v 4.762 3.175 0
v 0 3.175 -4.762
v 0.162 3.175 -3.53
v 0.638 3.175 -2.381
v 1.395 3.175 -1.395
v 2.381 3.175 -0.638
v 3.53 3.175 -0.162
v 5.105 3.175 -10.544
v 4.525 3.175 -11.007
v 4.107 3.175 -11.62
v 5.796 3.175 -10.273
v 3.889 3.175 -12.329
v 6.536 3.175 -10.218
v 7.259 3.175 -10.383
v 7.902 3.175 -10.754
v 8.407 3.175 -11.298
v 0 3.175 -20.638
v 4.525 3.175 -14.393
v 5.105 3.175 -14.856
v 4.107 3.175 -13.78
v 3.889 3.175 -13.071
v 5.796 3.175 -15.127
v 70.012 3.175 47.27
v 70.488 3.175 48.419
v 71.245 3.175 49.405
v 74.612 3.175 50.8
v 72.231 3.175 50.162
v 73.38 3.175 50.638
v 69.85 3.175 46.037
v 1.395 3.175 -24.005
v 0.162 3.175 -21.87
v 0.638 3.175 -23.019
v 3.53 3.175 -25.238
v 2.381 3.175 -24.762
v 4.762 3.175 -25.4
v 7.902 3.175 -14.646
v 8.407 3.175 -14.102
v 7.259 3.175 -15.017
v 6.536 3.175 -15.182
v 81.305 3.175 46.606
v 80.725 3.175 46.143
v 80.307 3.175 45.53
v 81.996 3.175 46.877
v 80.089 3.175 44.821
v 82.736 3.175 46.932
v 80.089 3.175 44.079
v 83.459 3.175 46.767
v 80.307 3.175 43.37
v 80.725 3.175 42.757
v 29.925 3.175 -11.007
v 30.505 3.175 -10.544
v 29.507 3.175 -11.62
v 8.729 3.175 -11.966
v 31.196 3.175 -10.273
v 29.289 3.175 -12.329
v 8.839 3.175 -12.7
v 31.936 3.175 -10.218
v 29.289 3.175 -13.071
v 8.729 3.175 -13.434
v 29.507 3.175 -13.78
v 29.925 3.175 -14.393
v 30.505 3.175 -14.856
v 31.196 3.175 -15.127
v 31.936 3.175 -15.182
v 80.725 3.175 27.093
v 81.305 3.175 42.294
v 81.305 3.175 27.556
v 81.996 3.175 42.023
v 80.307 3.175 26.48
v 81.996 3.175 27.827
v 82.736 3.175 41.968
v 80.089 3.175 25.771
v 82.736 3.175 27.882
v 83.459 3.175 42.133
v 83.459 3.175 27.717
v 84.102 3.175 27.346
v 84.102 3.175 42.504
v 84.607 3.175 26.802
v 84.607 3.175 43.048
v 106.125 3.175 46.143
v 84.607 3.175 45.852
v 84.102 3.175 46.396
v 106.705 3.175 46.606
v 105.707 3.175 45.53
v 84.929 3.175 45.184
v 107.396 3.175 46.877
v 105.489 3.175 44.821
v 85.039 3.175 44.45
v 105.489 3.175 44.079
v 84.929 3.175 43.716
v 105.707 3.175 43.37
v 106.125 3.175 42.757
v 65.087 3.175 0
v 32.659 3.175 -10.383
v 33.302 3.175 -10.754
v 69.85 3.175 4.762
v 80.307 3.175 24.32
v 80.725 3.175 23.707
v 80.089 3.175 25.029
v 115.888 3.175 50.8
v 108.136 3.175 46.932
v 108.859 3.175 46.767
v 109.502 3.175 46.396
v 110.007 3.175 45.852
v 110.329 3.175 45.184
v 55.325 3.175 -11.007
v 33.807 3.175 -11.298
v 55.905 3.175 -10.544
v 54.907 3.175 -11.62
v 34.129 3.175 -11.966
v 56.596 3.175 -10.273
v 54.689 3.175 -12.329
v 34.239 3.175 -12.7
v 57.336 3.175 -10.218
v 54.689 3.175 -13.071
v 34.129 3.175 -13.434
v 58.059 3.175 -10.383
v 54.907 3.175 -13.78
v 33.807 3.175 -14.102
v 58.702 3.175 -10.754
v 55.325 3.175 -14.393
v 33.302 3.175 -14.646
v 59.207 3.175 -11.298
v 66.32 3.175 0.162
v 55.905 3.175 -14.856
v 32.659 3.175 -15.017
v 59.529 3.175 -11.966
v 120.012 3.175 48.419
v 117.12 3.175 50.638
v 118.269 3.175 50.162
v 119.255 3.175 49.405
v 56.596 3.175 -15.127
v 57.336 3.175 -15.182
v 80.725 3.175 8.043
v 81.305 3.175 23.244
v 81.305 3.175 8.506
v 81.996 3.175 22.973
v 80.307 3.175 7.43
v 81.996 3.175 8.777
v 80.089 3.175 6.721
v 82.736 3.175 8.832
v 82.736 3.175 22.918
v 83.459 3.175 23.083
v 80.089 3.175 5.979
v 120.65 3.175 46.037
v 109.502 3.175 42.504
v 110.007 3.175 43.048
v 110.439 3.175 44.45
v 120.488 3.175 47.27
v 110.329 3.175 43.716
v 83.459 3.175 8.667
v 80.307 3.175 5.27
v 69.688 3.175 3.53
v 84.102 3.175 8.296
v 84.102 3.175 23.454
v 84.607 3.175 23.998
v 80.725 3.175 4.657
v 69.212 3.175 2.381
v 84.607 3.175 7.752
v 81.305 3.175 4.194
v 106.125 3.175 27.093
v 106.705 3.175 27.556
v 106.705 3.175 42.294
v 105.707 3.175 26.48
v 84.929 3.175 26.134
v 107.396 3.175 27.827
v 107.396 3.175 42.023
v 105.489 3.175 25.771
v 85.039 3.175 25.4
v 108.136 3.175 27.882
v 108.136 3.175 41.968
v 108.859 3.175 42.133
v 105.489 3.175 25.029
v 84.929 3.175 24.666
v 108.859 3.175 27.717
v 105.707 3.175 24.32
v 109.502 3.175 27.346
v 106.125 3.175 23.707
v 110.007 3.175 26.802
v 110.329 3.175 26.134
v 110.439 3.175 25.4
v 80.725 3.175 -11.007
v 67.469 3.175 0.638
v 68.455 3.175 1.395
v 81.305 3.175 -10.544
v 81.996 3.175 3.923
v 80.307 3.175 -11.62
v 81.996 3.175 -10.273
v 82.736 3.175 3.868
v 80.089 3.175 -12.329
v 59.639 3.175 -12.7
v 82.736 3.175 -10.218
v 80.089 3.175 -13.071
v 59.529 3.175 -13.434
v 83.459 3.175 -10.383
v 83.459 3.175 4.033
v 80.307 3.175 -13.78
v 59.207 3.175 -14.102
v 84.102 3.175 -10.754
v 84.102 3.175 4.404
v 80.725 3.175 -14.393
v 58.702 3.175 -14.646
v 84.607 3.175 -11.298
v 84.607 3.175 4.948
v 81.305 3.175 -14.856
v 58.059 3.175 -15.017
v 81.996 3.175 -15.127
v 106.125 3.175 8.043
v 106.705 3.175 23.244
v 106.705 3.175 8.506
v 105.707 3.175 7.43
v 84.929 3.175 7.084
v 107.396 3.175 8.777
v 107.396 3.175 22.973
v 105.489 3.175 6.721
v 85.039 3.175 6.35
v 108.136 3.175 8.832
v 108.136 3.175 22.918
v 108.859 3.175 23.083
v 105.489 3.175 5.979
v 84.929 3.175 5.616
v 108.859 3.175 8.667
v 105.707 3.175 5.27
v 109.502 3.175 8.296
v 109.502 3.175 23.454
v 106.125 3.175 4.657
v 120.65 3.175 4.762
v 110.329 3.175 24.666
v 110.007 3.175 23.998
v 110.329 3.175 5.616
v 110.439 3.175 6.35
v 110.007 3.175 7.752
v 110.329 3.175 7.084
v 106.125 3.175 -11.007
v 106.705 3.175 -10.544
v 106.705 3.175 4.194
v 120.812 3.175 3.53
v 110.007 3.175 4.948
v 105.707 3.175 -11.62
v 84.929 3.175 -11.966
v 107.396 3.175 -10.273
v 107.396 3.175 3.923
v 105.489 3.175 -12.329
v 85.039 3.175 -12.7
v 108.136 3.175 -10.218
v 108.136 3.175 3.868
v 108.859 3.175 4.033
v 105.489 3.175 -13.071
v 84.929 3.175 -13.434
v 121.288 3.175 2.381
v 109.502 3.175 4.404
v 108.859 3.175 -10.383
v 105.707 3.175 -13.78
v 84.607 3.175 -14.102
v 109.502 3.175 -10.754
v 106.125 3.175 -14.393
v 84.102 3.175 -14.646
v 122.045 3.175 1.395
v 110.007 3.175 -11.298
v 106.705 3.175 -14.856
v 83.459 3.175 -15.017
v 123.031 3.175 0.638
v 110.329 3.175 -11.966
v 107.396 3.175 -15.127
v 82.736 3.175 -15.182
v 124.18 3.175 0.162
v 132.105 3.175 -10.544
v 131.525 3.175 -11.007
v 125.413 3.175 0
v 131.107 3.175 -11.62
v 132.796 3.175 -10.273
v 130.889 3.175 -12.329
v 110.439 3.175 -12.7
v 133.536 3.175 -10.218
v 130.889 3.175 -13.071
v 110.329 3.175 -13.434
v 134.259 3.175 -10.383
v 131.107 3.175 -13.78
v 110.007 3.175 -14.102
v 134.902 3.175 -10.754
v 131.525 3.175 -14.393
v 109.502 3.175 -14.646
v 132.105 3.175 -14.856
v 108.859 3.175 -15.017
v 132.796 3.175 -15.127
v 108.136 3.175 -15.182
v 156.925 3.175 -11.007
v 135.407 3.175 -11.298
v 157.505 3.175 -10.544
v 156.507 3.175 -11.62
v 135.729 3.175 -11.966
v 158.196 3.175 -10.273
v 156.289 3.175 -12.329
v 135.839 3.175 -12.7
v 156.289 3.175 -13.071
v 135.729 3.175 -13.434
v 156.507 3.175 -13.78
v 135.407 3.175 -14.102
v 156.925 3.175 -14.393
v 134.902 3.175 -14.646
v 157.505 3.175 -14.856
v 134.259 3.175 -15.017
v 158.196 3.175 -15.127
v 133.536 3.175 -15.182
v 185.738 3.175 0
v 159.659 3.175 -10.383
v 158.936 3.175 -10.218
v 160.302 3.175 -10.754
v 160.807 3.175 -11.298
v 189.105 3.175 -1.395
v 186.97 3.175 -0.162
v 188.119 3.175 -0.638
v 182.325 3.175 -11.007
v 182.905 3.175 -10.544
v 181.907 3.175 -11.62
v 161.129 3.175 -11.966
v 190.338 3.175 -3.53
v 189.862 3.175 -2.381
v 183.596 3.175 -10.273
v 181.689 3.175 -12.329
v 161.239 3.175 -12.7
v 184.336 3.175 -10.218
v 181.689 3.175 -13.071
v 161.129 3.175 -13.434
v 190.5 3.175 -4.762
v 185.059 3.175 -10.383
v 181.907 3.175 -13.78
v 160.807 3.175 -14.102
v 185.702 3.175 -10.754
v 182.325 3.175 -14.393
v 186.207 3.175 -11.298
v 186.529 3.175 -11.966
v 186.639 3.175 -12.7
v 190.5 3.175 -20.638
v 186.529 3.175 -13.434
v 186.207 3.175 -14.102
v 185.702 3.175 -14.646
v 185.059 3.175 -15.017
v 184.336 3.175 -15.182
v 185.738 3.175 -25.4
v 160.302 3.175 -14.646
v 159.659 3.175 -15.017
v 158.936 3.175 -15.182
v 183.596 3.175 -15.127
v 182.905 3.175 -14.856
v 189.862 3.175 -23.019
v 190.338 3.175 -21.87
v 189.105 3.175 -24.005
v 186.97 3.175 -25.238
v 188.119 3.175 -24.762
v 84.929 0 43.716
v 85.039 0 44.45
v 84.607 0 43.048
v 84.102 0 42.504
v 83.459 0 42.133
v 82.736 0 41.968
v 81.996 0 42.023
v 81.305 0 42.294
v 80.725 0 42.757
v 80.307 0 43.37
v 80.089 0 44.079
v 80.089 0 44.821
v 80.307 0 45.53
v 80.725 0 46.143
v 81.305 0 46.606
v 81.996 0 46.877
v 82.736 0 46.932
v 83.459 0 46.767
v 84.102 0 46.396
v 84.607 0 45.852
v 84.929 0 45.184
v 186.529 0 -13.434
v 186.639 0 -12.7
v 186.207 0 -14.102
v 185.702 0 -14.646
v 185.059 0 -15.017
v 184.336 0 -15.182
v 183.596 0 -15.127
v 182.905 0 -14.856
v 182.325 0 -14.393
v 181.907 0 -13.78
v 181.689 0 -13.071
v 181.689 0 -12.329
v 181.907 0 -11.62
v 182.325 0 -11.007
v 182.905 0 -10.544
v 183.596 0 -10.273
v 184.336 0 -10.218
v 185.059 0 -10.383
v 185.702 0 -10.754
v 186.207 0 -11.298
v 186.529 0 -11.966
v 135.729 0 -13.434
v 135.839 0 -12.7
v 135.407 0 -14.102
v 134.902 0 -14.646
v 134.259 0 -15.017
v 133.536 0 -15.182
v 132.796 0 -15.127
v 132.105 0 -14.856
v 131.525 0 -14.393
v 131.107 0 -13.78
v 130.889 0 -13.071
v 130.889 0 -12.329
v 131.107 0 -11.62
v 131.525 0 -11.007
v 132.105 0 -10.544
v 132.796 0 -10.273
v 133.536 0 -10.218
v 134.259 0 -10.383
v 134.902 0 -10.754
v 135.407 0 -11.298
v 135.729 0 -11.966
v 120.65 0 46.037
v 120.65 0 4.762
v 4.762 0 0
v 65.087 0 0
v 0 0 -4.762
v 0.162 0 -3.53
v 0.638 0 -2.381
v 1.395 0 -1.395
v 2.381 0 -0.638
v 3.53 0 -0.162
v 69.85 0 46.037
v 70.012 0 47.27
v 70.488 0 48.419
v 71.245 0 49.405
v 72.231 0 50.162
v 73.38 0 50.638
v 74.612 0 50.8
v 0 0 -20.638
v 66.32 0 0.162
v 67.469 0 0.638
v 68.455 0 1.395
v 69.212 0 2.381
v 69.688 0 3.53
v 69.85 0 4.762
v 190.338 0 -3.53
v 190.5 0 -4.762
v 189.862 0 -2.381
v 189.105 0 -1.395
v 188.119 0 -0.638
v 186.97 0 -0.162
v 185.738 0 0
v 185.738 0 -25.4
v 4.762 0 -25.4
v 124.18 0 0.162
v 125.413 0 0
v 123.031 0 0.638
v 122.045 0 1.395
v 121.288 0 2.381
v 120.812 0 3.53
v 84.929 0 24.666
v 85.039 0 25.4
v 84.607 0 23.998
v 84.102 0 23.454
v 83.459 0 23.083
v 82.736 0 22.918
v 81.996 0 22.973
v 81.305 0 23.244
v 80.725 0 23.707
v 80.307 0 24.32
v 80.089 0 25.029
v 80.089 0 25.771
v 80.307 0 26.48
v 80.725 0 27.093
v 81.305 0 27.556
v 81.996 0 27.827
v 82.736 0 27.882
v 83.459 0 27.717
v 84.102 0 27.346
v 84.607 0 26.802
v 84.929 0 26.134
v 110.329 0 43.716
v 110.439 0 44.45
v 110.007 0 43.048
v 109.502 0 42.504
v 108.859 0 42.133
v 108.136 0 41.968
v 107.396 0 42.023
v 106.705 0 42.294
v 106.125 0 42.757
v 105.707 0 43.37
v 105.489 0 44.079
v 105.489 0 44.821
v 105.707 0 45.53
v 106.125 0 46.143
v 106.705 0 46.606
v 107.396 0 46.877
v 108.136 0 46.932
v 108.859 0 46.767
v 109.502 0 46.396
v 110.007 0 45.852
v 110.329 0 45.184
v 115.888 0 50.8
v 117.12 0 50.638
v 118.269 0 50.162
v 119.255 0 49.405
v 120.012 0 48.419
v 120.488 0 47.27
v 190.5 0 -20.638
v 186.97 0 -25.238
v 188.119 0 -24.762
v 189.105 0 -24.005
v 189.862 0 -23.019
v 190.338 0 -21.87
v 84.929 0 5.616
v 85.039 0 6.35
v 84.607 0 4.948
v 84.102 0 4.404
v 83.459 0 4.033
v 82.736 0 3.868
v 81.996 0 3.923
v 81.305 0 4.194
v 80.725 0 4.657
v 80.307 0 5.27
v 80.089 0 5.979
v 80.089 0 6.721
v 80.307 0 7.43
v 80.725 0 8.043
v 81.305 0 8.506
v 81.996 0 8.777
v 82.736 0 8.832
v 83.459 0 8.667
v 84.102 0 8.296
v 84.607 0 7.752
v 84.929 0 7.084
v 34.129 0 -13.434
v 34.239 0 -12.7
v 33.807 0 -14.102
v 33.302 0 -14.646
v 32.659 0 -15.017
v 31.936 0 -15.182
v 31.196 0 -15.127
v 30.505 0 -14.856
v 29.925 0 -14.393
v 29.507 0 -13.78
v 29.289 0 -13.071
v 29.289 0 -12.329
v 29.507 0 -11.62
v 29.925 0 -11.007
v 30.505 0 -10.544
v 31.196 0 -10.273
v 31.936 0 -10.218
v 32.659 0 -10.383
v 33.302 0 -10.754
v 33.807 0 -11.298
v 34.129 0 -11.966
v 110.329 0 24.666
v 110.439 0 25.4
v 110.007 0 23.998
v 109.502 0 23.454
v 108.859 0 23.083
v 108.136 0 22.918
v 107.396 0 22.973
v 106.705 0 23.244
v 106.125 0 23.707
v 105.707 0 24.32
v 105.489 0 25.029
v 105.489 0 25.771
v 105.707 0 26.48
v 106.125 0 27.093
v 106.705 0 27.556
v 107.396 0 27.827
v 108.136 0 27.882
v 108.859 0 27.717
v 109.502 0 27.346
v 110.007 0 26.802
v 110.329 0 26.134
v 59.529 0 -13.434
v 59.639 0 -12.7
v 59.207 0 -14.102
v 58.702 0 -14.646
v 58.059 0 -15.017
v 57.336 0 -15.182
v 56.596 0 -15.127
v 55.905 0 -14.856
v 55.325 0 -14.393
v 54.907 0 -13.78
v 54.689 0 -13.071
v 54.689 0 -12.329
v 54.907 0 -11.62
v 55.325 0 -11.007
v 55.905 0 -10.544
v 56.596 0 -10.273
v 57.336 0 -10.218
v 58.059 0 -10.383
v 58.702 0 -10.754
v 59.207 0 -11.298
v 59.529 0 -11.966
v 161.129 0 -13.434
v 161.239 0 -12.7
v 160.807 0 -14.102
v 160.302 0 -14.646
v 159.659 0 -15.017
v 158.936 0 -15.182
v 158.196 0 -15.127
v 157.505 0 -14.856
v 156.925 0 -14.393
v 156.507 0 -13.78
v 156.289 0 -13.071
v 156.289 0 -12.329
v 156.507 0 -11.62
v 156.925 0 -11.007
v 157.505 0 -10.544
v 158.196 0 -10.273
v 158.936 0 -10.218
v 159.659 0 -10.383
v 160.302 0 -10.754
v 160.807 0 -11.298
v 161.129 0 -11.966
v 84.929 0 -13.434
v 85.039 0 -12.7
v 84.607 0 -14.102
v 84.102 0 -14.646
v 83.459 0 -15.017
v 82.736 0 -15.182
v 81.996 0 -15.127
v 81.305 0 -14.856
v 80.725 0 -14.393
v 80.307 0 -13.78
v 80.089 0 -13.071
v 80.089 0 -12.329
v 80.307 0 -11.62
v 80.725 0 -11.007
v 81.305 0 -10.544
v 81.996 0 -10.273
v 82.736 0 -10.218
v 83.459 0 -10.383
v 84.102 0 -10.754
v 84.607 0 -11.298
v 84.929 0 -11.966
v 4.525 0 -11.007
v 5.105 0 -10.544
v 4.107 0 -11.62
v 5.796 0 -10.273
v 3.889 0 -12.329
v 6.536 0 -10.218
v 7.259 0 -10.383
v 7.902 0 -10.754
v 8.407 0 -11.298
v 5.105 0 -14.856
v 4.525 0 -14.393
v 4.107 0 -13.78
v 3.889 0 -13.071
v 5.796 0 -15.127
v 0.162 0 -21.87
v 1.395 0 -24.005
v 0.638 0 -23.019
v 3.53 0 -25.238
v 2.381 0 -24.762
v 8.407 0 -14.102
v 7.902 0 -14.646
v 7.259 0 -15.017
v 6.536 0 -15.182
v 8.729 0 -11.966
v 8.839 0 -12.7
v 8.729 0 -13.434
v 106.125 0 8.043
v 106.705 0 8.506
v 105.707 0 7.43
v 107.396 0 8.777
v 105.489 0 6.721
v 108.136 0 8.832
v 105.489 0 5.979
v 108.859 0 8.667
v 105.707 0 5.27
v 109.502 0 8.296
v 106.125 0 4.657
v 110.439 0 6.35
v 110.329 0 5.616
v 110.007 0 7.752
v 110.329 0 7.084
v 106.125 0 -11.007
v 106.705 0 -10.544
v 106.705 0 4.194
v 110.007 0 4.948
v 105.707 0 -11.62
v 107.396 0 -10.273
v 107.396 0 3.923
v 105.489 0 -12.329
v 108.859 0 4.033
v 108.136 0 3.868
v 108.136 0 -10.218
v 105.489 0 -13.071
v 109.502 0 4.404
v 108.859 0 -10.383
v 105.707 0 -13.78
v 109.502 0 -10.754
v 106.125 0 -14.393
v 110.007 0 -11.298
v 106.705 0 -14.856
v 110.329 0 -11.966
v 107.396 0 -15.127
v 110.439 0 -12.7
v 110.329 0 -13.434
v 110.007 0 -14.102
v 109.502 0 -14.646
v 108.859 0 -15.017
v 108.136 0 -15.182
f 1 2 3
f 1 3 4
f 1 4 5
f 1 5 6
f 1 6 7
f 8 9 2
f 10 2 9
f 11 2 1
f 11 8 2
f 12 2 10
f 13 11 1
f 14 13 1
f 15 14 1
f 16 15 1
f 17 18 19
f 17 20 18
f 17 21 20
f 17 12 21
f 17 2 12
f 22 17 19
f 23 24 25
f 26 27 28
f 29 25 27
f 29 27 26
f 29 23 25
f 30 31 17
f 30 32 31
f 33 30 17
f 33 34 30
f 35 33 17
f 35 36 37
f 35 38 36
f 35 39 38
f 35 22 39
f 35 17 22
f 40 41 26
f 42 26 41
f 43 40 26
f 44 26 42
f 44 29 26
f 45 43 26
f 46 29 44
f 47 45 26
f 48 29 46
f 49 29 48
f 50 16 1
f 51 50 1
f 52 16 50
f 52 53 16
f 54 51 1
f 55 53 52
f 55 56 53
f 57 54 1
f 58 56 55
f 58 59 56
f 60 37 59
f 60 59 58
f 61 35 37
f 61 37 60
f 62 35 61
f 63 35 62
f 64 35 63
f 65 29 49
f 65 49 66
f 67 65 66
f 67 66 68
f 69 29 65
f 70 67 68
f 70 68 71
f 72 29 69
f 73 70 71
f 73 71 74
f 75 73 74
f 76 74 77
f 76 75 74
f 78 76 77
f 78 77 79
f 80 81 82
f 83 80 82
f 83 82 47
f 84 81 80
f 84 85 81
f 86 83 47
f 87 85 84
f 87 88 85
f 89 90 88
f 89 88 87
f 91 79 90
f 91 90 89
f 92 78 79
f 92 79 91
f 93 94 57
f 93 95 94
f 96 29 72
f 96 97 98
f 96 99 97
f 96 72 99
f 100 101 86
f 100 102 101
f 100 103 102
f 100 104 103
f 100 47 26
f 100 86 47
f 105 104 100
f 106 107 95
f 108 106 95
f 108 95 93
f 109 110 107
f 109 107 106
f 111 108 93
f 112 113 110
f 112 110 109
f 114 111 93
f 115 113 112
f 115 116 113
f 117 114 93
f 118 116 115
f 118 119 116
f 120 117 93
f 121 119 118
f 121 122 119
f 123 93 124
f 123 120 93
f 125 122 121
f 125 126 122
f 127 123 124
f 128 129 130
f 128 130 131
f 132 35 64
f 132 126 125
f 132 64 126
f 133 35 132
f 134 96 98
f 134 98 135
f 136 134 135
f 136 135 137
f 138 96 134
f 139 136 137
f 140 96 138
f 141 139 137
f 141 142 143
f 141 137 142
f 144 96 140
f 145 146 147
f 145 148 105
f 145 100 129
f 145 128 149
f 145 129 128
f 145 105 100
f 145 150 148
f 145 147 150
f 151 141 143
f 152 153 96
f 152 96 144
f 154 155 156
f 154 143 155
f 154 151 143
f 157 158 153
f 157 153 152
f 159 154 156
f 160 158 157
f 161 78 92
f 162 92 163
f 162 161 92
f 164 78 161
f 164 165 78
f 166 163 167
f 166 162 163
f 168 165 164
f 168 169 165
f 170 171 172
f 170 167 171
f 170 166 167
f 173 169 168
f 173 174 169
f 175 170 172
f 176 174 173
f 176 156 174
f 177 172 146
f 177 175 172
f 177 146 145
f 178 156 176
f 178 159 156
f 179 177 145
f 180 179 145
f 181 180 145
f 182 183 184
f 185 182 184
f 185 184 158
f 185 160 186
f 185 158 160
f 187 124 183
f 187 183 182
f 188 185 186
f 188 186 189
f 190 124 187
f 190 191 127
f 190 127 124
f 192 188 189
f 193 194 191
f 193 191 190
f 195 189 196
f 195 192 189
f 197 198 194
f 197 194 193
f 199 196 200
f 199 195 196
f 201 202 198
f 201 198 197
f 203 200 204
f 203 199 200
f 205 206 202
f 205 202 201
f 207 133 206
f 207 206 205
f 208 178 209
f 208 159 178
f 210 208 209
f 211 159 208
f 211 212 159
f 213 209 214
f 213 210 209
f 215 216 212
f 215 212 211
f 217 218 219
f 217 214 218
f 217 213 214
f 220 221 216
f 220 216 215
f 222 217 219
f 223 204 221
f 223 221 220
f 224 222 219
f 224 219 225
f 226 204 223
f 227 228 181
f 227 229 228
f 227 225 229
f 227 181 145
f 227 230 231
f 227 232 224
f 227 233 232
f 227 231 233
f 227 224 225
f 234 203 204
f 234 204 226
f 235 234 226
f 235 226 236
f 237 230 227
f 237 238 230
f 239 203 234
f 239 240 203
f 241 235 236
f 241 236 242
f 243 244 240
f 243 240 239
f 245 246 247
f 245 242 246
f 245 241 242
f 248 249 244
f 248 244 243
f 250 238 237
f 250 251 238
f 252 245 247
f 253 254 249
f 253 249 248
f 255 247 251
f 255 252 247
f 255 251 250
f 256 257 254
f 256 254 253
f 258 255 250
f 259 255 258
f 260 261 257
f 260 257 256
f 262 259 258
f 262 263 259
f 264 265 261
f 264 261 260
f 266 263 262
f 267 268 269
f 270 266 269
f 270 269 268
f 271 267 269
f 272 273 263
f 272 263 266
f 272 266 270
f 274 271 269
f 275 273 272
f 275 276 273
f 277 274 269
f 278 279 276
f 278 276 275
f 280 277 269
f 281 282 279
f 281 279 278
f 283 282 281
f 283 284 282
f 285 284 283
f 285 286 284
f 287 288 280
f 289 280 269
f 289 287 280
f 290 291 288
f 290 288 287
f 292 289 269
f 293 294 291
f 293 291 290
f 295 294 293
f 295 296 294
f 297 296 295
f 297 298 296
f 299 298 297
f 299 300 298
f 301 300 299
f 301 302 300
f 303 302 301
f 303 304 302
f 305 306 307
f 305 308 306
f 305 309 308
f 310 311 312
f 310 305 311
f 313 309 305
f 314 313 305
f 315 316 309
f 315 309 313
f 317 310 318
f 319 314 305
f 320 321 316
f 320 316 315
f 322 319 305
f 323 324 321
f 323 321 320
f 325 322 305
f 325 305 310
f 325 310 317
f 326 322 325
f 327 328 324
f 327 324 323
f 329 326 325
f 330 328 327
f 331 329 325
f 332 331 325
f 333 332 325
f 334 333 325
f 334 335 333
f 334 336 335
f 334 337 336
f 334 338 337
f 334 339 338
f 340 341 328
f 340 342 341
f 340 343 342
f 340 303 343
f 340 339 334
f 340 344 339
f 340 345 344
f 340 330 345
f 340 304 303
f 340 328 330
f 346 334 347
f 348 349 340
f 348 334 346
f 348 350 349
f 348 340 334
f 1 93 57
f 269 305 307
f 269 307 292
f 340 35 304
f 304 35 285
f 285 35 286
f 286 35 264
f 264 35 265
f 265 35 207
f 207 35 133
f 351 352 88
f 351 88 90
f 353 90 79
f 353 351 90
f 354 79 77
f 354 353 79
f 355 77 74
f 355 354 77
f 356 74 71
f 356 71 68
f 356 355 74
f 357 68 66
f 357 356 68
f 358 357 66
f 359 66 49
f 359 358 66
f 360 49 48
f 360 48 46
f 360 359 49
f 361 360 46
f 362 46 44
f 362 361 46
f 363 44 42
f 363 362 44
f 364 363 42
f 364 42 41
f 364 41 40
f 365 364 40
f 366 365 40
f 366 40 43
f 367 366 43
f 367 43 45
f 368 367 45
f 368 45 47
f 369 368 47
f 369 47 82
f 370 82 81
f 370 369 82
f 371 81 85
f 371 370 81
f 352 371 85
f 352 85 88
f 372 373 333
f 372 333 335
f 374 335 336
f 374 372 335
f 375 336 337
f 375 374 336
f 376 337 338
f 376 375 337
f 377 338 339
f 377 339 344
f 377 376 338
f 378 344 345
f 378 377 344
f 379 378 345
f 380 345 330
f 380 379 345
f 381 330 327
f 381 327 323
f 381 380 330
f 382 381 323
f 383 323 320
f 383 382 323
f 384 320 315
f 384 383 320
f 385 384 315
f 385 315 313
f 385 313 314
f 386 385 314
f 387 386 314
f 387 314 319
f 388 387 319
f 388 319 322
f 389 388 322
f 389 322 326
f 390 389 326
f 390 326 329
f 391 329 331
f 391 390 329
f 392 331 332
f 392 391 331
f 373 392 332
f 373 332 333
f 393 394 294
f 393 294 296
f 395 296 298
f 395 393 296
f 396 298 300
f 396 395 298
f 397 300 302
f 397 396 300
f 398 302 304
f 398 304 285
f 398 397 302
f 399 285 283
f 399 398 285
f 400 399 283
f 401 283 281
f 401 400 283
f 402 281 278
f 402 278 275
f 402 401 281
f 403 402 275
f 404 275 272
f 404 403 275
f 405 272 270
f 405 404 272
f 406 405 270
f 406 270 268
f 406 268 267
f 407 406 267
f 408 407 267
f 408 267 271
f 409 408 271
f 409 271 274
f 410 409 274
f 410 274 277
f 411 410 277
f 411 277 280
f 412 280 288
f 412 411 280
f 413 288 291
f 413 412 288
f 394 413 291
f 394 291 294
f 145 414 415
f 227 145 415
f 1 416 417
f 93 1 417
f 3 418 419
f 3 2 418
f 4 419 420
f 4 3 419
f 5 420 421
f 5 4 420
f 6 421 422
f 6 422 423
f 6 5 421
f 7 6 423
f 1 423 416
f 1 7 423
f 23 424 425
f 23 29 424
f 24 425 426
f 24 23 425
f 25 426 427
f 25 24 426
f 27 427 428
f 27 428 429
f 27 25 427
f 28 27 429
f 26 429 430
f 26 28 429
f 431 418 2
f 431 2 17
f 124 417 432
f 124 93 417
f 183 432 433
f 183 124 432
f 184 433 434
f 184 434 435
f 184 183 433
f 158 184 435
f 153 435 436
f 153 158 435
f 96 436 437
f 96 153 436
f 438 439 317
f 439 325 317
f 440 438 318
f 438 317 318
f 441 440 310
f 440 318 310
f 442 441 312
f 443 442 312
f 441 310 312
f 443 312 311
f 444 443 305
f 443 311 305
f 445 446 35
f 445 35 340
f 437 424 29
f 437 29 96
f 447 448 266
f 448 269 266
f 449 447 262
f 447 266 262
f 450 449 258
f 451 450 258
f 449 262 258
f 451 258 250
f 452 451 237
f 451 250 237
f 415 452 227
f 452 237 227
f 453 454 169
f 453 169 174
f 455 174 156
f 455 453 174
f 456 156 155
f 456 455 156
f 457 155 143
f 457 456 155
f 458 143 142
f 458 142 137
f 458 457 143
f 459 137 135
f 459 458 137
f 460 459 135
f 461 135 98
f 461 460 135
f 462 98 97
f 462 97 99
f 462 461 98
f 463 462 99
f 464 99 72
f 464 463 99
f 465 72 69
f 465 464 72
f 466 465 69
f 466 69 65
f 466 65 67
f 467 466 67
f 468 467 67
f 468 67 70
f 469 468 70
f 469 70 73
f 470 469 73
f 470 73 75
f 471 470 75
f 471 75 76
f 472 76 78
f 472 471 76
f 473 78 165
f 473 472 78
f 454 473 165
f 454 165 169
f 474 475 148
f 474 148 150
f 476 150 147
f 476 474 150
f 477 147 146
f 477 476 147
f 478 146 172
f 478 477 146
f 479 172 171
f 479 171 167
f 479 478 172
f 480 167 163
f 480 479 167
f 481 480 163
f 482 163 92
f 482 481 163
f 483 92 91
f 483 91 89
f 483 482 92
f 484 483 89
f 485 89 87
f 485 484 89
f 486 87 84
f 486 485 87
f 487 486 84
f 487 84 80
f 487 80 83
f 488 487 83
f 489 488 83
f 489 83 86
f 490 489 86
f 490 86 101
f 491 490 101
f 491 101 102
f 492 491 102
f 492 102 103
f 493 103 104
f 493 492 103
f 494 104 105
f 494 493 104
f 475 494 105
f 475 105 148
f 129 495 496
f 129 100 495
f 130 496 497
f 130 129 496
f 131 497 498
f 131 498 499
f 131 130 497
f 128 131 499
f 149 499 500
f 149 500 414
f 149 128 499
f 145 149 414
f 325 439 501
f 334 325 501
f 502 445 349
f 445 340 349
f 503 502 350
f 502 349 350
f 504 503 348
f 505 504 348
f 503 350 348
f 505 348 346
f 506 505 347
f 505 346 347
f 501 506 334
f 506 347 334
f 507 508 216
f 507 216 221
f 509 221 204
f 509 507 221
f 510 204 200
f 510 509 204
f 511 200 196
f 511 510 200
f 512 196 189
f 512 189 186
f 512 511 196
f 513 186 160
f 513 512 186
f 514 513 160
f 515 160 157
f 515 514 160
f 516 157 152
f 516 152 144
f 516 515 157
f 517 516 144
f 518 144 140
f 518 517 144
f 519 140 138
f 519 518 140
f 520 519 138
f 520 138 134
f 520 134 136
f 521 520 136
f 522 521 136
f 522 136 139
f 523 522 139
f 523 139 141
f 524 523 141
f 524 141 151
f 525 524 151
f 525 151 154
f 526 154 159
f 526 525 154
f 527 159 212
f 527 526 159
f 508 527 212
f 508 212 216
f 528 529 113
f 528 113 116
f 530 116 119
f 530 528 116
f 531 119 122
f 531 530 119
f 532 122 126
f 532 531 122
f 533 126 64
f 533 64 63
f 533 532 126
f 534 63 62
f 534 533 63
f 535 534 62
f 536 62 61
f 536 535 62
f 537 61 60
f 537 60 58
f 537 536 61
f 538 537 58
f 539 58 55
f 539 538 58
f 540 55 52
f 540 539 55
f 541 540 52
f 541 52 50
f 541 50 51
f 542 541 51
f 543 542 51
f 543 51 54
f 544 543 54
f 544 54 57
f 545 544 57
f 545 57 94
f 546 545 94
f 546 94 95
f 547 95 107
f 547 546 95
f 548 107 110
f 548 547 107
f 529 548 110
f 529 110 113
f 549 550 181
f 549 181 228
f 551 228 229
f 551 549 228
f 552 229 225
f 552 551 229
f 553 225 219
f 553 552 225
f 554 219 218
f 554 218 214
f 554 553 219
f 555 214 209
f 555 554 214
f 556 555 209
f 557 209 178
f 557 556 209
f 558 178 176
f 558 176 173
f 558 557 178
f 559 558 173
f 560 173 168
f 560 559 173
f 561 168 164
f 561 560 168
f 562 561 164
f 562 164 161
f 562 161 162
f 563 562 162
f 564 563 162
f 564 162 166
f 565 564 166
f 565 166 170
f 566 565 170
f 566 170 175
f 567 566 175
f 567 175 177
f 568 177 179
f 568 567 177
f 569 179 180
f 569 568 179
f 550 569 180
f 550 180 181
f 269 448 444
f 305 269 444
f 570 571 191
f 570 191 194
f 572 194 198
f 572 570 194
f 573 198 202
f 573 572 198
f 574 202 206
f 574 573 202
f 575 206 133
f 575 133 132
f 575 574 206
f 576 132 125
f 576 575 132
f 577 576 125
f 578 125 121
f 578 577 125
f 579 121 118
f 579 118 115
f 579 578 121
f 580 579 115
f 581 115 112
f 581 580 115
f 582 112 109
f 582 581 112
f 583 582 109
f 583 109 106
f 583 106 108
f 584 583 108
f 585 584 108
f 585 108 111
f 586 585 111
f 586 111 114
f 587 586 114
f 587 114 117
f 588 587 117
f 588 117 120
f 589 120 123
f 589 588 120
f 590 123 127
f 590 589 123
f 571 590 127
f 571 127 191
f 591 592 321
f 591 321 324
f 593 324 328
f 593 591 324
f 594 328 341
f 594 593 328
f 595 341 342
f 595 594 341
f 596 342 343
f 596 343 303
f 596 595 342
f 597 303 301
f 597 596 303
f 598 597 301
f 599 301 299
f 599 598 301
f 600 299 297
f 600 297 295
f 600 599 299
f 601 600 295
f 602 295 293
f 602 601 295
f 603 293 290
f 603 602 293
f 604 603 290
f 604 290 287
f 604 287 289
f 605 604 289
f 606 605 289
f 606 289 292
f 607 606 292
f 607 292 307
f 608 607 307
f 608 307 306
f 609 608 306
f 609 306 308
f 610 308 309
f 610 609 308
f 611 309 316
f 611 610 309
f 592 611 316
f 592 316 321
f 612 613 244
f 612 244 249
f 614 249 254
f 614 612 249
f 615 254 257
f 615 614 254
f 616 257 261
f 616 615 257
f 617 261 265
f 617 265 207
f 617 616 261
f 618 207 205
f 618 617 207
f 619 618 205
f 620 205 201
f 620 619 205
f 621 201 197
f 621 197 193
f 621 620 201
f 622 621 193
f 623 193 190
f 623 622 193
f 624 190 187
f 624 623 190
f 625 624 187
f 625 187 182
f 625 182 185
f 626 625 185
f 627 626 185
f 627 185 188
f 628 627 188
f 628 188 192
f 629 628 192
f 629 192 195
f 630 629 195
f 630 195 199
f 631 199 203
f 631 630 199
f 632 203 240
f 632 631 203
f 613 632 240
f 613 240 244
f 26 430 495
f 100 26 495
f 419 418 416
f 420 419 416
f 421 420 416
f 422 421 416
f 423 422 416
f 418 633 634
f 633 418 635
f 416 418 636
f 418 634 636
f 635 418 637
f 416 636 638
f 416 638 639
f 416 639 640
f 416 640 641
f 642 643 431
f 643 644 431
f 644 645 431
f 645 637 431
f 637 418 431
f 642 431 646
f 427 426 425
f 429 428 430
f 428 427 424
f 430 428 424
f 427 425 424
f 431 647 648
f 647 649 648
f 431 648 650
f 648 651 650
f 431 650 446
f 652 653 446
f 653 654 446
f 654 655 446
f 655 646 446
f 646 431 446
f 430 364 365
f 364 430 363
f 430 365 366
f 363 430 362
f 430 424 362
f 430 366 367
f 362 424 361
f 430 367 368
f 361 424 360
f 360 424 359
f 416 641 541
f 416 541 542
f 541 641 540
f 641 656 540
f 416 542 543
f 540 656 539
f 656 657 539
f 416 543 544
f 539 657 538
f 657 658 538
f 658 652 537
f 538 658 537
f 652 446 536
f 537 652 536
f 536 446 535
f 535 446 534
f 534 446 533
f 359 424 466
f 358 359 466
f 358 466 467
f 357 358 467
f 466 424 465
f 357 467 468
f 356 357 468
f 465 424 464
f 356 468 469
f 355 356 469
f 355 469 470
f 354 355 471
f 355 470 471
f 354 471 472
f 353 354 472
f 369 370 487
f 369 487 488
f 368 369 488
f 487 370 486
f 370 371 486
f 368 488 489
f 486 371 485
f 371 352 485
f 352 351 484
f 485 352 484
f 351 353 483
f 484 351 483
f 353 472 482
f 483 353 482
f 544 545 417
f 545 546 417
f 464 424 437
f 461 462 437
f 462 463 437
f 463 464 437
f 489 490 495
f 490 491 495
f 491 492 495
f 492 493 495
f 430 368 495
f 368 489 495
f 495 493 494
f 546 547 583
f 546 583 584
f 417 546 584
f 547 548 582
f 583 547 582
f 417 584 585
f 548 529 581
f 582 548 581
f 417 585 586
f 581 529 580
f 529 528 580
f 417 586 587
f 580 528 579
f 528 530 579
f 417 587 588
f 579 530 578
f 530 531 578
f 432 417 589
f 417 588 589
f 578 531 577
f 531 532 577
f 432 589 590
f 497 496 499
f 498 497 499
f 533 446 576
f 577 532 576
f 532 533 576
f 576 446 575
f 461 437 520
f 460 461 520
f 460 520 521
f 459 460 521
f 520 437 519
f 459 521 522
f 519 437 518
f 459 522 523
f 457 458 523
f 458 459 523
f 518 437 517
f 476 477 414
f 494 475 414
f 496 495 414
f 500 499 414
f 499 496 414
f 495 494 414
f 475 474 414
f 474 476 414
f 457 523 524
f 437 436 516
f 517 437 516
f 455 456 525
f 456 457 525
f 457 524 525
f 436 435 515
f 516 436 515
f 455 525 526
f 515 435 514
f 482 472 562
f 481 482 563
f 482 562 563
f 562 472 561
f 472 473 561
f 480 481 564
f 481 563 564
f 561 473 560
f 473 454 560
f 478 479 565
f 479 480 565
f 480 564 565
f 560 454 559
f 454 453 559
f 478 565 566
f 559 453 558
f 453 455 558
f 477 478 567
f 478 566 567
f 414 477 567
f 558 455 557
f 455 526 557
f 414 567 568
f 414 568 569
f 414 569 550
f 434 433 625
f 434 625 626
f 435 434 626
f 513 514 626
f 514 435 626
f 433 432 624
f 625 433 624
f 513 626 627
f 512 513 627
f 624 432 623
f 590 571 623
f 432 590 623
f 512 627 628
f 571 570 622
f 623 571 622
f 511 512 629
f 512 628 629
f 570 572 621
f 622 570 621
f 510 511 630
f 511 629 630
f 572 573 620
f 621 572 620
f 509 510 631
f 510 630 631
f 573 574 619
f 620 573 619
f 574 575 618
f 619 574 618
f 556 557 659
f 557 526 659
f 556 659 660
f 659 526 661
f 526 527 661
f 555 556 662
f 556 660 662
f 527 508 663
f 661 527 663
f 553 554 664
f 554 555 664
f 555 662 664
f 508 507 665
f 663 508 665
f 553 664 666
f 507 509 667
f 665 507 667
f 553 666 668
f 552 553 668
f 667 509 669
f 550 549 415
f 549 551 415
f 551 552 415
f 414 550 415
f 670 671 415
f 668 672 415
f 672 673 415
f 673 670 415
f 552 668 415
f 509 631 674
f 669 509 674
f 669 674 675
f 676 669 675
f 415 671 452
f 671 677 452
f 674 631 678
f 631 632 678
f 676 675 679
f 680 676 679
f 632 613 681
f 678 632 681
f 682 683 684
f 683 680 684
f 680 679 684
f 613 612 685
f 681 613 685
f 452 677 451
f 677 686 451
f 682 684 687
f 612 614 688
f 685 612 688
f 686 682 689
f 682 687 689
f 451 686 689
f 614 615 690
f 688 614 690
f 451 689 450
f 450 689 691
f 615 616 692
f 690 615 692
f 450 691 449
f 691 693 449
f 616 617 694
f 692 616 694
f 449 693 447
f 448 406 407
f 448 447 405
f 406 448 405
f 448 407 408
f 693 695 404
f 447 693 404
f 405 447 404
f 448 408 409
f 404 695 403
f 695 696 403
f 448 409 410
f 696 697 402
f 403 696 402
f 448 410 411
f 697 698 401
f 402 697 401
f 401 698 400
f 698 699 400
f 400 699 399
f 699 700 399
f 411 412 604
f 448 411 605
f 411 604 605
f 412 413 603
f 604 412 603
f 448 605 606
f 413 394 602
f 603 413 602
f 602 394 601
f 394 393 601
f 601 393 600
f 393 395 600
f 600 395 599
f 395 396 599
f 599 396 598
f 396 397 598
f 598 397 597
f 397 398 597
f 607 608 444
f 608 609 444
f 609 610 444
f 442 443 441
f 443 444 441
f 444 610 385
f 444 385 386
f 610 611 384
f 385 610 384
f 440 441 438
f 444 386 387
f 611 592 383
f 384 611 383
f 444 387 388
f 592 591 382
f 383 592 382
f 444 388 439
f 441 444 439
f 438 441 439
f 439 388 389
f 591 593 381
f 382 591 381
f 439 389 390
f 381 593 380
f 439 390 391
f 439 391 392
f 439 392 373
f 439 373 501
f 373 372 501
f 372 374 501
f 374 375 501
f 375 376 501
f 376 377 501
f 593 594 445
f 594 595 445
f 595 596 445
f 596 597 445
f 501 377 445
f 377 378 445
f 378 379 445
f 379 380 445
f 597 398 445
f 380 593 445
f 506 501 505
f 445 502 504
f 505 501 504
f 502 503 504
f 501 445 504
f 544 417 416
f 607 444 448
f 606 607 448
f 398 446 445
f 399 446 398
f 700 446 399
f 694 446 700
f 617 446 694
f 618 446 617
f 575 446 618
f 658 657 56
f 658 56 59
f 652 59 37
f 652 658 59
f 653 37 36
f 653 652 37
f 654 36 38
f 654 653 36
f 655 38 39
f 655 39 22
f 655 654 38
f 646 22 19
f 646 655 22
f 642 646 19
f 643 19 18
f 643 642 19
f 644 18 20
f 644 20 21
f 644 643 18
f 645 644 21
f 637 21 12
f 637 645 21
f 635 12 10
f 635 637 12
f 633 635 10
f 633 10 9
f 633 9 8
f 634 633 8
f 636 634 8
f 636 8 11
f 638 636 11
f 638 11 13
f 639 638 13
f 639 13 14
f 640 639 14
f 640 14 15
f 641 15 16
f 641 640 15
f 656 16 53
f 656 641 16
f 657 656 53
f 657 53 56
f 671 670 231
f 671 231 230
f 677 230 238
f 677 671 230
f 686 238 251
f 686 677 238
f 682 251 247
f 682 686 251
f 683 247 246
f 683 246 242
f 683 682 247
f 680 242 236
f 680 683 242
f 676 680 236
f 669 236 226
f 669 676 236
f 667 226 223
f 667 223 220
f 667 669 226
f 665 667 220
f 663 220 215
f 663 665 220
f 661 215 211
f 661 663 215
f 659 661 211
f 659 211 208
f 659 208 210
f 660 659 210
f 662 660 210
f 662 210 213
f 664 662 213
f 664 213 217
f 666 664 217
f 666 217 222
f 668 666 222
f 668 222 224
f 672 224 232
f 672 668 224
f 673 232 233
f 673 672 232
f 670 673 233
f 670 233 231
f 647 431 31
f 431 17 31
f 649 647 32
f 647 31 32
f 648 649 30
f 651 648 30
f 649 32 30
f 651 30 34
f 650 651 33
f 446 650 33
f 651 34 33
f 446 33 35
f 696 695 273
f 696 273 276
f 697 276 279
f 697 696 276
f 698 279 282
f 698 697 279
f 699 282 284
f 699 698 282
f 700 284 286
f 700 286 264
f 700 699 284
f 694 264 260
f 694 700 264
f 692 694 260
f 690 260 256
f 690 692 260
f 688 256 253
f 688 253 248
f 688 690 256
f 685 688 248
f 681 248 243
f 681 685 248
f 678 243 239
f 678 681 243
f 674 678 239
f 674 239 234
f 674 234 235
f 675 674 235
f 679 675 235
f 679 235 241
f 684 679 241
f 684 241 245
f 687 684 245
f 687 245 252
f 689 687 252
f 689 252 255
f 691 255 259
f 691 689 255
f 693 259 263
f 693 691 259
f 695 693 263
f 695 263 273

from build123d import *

# Parameters (mm, degrees)
SKETCH1_W           = 190.5
SKETCH1_H           = 25.4
SKETCH1_R           = 2.4892
SKETCH1_W_2         = 50.8
SKETCH1_H_2         = 50.8
BOSS_EXTRUDE1_DEPTH = 3.175
FILLET1_R           = 4.7625


with BuildPart() as part:
    # Sketch1 → Boss-Extrude1 (new body)
    with BuildSketch(Plane(origin=(0, 0, 0), x_dir=(1, 0, 0), z_dir=(0, 1, 0))):
        with Locations((95.25, 12.7)):
            Rectangle(SKETCH1_W, SKETCH1_H)
        with Locations((6.35, 12.7)):
            Circle(SKETCH1_R, mode=Mode.SUBTRACT)
        with Locations((31.75, 12.7)):
            Circle(SKETCH1_R, mode=Mode.SUBTRACT)
        with Locations((57.15, 12.7)):
            Circle(SKETCH1_R, mode=Mode.SUBTRACT)
        with Locations((82.55, 12.7)):
            Circle(SKETCH1_R, mode=Mode.SUBTRACT)
        with Locations((107.95, 12.7)):
            Circle(SKETCH1_R, mode=Mode.SUBTRACT)
        with Locations((133.35, 12.7)):
            Circle(SKETCH1_R, mode=Mode.SUBTRACT)
        with Locations((158.75, 12.7)):
            Circle(SKETCH1_R, mode=Mode.SUBTRACT)
        with Locations((184.15, 12.7)):
            Circle(SKETCH1_R, mode=Mode.SUBTRACT)
        with Locations((95.25, -25.4)):
            Rectangle(SKETCH1_W_2, SKETCH1_H_2)
        with Locations((82.55, -6.35)):
            Circle(SKETCH1_R, mode=Mode.SUBTRACT)
        with Locations((107.95, -6.35)):
            Circle(SKETCH1_R, mode=Mode.SUBTRACT)
        with Locations((107.95, -25.4)):
            Circle(SKETCH1_R, mode=Mode.SUBTRACT)
        with Locations((107.95, -44.45)):
            Circle(SKETCH1_R, mode=Mode.SUBTRACT)
        with Locations((82.55, -25.4)):
            Circle(SKETCH1_R, mode=Mode.SUBTRACT)
        with Locations((82.55, -44.45)):
            Circle(SKETCH1_R, mode=Mode.SUBTRACT)
    extrude(amount=BOSS_EXTRUDE1_DEPTH)

    # Fillet1
    fillet1_edges = [part.edges().sort_by_distance(p)[0] for p in [
        (120.65, 1.5875, 50.8),
        (69.85, 1.5875, 50.8),
        (69.85, 1.5875, 0),
        (0, 1.5875, 0),
        (0, 1.5875, -25.4),
        (190.5, 1.5875, -25.4),
        (190.5, 1.5875, 0),
        (120.65, 1.5875, 0),
    ]]
    fillet(fillet1_edges, radius=FILLET1_R)


solid = part.part
